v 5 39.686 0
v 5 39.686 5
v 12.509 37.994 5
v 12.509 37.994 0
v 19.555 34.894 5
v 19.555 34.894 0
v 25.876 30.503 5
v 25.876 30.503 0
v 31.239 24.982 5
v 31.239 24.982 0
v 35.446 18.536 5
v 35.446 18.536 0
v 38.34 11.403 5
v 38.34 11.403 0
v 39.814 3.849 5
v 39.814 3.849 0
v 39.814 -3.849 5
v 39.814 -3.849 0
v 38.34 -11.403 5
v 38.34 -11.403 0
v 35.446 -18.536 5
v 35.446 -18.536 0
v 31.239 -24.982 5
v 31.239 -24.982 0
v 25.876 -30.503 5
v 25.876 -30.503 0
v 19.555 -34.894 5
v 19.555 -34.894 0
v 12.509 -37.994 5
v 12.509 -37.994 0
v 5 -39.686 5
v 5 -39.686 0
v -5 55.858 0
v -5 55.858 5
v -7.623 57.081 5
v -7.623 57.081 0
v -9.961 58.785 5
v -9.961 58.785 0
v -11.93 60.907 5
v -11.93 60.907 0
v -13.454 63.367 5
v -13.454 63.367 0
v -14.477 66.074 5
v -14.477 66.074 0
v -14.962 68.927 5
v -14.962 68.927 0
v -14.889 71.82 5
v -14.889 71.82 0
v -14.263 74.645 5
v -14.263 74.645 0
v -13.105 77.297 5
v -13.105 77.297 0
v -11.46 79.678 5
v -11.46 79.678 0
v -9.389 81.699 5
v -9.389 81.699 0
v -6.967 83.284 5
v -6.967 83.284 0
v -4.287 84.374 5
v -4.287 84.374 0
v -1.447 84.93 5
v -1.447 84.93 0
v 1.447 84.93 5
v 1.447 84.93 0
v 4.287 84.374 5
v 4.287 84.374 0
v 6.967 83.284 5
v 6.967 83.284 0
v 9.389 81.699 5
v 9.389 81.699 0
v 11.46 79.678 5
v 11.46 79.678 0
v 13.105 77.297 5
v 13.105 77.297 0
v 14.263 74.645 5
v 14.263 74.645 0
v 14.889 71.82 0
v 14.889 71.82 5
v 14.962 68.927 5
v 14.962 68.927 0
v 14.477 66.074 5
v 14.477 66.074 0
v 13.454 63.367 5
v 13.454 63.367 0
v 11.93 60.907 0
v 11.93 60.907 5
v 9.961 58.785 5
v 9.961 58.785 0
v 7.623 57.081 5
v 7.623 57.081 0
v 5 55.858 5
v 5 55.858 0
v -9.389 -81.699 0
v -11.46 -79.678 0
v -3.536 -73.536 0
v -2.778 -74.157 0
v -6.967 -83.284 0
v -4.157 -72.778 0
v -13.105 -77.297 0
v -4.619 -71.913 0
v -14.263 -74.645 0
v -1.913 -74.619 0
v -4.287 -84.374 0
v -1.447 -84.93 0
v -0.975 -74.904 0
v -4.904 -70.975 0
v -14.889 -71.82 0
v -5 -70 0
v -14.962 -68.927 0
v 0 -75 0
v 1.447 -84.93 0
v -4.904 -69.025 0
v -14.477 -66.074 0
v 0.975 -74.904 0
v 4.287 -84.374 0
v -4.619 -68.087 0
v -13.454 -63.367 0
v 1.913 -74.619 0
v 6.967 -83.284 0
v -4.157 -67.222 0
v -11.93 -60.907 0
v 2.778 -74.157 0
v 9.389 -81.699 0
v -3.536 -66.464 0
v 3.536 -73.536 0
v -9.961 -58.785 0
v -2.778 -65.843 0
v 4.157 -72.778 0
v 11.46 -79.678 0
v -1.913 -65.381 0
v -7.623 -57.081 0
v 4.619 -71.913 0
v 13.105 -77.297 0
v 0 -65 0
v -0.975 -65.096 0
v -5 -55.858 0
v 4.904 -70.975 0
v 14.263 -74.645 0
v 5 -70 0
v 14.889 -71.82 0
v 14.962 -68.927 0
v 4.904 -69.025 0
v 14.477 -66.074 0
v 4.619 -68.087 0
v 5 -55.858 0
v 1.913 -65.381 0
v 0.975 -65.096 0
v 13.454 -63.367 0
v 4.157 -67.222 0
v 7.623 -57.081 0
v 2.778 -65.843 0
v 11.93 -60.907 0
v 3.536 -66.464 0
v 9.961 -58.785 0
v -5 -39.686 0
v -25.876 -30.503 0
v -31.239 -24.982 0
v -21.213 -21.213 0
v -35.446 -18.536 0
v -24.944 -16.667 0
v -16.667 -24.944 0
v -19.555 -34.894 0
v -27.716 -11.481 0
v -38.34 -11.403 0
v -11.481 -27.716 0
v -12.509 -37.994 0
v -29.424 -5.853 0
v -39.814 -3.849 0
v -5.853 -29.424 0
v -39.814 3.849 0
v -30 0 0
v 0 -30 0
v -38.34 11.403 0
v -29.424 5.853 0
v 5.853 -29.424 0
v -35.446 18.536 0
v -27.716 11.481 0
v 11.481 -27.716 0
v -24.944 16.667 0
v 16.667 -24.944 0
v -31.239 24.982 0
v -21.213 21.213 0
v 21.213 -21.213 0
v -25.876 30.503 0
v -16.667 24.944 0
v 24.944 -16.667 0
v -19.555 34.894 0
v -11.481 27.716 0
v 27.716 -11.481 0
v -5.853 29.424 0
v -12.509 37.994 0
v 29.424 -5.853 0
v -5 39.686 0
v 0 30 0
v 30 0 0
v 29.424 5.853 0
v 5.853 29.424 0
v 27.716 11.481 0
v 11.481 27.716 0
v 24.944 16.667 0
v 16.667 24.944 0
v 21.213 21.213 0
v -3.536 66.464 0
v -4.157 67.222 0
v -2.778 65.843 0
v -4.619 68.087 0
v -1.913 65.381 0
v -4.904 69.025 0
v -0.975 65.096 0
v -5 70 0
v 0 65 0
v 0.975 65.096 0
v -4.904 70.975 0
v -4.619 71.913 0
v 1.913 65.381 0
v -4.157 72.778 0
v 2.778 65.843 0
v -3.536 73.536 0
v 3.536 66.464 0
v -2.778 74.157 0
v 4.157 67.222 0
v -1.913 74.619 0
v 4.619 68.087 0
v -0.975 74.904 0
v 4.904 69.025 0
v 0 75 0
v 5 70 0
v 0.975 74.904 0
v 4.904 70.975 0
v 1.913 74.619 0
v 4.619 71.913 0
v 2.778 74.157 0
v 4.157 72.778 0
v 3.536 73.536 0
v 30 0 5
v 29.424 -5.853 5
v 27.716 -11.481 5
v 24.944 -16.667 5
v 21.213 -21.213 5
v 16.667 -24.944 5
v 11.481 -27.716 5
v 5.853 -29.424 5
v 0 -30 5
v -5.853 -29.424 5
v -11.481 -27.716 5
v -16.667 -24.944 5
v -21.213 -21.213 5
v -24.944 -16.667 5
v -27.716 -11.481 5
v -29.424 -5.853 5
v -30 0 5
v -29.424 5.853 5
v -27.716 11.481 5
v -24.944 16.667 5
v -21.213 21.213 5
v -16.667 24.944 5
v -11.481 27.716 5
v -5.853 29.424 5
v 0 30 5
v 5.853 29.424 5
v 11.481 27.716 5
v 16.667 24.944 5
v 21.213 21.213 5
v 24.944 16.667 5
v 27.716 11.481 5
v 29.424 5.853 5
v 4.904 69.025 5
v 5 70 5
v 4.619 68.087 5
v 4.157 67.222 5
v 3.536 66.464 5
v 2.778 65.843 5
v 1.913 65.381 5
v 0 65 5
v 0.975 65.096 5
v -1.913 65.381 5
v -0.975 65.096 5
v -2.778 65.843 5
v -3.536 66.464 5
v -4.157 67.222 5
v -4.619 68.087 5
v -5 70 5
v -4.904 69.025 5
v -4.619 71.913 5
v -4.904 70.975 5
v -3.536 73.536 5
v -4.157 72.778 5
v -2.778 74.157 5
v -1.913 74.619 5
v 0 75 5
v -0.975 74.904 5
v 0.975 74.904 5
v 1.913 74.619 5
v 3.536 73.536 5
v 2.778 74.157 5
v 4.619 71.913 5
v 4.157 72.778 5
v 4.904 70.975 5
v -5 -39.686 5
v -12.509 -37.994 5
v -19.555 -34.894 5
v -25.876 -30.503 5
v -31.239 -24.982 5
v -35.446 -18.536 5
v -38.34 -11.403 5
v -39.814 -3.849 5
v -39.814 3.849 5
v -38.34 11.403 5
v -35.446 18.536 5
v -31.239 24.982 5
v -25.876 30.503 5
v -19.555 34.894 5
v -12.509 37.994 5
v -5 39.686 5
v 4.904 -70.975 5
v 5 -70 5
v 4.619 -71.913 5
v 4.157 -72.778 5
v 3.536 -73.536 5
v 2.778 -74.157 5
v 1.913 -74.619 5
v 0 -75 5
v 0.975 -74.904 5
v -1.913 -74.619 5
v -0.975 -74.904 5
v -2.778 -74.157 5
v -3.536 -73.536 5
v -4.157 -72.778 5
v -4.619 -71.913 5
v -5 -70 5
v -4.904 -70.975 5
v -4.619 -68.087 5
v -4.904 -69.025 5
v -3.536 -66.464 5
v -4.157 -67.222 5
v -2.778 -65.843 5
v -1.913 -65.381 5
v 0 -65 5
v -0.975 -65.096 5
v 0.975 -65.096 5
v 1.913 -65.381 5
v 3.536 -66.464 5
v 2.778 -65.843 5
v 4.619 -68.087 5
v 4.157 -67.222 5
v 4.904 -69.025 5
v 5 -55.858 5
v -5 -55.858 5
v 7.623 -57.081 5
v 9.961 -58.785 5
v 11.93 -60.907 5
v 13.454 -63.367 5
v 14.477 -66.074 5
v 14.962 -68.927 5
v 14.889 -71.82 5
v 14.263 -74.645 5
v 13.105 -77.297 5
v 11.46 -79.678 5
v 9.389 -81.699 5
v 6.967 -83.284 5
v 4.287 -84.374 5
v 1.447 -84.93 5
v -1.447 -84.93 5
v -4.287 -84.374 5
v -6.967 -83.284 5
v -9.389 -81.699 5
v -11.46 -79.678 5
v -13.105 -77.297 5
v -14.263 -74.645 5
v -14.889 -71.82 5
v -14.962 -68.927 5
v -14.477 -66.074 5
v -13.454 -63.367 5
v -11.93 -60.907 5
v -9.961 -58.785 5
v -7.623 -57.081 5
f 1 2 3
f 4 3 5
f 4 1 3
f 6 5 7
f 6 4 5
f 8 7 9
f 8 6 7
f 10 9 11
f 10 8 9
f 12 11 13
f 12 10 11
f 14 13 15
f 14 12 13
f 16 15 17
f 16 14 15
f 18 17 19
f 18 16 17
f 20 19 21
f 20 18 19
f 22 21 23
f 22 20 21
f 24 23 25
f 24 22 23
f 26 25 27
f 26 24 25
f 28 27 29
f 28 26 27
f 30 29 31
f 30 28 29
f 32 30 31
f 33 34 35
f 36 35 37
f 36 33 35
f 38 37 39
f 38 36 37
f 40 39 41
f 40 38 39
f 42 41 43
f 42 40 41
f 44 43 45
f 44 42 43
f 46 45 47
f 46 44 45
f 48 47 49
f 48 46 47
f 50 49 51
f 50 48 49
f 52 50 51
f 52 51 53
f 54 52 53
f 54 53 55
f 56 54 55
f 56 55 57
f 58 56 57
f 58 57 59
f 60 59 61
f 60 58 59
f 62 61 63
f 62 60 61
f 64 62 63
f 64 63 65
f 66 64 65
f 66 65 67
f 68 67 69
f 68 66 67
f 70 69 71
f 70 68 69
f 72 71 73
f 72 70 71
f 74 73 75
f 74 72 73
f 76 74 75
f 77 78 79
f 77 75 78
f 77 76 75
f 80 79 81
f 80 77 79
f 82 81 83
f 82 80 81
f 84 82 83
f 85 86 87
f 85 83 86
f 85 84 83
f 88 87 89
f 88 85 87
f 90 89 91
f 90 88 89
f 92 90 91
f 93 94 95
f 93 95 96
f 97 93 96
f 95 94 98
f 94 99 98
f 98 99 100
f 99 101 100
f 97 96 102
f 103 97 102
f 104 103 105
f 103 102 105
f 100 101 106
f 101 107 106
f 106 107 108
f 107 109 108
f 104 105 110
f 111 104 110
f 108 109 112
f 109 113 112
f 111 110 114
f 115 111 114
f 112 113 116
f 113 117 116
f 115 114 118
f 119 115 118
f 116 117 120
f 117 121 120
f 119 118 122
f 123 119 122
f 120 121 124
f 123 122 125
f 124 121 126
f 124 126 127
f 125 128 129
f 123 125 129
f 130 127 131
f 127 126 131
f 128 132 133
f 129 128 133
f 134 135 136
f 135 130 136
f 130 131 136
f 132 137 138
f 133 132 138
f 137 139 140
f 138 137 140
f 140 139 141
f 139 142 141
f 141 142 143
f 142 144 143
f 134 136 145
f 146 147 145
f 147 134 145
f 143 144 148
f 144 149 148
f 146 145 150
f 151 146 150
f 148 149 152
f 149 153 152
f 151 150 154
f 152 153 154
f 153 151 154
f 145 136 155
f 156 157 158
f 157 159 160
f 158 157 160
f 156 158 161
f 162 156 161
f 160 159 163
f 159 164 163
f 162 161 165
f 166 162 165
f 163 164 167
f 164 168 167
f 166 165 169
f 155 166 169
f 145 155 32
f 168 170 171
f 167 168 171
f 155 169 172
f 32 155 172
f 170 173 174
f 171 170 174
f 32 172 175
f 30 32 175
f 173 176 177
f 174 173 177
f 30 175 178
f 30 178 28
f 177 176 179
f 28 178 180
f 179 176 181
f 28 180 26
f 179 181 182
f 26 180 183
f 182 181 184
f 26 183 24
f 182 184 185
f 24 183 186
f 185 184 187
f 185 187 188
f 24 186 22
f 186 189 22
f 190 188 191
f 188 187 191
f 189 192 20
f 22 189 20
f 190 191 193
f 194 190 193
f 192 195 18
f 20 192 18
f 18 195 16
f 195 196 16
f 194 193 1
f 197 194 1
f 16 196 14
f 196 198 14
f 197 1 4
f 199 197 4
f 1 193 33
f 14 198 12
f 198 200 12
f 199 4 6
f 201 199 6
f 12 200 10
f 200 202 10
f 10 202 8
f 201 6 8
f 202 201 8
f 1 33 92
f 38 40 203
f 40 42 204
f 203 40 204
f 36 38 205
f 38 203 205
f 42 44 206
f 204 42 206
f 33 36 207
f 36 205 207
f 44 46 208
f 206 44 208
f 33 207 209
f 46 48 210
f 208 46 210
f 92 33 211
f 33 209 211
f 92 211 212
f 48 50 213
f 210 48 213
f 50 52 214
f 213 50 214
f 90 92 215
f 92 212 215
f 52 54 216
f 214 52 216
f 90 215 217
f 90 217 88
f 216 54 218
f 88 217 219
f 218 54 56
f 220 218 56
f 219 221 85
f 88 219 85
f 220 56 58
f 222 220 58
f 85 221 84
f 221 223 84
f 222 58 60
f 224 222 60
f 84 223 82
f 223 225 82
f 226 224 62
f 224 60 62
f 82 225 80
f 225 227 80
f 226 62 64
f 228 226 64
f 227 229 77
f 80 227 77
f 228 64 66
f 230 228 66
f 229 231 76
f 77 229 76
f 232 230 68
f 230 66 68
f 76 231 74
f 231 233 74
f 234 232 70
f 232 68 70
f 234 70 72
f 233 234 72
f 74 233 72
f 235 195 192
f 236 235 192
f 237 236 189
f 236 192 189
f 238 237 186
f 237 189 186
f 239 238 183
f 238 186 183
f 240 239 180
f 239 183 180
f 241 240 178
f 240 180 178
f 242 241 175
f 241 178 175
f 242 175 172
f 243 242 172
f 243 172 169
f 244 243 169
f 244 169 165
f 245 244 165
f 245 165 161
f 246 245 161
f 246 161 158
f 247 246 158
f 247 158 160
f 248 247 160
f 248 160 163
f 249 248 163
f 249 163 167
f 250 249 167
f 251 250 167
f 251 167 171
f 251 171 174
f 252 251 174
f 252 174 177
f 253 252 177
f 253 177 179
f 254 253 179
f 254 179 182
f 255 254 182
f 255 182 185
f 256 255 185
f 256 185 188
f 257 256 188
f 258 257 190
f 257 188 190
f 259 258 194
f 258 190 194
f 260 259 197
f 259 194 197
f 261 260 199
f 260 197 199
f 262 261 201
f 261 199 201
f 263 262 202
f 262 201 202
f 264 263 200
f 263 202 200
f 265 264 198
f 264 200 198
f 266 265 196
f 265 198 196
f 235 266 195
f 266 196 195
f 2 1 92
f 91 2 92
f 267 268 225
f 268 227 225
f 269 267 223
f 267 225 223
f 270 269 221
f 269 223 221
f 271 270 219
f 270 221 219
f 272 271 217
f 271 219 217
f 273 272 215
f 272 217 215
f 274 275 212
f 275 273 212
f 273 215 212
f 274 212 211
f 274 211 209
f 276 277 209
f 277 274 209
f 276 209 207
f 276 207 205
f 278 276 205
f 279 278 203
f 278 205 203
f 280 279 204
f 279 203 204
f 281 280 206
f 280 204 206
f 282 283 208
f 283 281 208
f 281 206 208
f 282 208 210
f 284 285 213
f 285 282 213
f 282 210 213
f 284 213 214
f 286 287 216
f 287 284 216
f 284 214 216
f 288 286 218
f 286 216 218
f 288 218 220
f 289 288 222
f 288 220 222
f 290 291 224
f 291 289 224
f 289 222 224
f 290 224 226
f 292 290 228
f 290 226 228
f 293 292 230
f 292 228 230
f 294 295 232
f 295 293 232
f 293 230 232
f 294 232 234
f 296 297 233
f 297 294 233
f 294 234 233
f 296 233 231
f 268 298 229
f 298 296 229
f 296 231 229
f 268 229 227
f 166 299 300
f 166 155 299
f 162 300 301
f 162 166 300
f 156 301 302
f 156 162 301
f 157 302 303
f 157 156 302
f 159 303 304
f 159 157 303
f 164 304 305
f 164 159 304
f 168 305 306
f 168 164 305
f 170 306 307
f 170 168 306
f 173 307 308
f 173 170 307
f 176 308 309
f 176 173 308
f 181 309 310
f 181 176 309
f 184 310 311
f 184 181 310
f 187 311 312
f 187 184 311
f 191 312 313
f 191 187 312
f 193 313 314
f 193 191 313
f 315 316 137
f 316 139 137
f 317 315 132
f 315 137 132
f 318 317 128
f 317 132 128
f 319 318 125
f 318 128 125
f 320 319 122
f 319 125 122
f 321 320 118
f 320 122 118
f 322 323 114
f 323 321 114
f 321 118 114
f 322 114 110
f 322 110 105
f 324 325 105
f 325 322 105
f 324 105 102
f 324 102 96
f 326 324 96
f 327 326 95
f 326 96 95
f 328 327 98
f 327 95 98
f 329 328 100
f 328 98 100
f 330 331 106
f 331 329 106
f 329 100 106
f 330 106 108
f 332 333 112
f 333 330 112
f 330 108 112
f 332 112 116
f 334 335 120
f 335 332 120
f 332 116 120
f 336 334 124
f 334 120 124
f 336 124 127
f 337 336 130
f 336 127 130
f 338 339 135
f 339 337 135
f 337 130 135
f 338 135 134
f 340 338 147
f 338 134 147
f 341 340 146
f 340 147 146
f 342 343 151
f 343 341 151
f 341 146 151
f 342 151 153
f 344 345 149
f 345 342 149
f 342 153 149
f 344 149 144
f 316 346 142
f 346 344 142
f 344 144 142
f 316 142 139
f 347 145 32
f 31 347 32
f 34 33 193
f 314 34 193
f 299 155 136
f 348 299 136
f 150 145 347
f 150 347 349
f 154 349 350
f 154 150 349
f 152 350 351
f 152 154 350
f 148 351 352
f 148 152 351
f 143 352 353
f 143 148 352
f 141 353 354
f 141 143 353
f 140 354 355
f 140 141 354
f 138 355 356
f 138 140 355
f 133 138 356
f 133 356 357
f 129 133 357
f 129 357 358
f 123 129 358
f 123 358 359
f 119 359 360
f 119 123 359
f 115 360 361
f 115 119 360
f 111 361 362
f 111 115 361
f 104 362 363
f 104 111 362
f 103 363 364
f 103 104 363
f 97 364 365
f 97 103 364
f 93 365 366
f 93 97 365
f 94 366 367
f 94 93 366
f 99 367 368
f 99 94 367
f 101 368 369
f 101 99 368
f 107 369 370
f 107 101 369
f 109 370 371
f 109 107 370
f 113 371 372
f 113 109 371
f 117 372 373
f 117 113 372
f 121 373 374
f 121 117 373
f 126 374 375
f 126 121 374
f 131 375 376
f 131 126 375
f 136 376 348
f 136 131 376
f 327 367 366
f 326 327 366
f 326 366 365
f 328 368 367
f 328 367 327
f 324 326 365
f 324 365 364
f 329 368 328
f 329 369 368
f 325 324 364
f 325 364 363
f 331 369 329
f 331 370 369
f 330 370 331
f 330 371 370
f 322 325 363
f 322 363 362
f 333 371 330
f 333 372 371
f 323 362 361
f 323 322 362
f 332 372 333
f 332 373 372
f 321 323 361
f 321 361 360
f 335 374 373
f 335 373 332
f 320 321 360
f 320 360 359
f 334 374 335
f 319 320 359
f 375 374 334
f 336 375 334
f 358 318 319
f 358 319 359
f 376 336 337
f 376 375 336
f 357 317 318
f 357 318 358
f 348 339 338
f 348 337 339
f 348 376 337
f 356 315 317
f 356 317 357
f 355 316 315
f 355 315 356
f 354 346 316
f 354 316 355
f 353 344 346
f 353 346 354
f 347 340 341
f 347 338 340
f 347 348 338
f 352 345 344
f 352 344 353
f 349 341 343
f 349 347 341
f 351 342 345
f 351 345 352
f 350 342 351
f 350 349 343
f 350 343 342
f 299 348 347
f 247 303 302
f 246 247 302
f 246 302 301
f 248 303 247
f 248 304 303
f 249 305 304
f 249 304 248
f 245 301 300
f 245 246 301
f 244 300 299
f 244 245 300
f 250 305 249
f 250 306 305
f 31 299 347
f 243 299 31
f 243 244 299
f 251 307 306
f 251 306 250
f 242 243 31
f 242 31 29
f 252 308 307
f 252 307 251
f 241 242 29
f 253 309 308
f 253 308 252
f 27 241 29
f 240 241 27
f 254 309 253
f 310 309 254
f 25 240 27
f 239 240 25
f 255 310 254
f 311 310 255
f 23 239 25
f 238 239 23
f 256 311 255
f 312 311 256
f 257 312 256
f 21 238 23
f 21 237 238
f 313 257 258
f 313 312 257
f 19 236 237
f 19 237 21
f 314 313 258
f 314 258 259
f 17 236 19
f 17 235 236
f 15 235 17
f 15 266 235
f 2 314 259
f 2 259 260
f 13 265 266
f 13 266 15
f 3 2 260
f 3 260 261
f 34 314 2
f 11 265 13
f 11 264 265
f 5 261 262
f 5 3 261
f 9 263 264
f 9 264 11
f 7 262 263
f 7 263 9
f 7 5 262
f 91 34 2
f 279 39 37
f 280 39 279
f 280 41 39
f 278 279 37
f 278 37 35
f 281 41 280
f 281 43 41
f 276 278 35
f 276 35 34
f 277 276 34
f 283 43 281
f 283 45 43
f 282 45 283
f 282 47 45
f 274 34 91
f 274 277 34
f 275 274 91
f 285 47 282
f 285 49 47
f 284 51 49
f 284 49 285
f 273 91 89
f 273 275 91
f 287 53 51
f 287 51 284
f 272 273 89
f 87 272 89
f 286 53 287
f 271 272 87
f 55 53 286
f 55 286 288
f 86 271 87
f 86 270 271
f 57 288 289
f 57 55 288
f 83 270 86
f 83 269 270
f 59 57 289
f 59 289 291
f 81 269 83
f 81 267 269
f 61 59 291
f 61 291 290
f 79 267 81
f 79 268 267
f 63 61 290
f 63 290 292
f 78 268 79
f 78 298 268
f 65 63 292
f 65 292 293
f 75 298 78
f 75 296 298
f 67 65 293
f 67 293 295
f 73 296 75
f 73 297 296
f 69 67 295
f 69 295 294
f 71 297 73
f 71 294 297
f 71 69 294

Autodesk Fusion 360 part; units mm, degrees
sketch "Sketch1" plane through (0, 0, 0) normal (0, 0, 1) x (1, 0, 0)
  circle A0 centre (0, 0) radius 90
  circle A1 centre (0, 65) radius 10
  circle A2 centre (0, -65) radius 10
  circle A3 centre (0, 0) radius 25
  circle A4 centre (0, 0) radius 35
  circle A5 centre (0, 65) radius 20
  circle A6 centre (0, -65) radius 20
  line L0 (-10, 30) -> (10, 30)
  line L1 (10, 30) -> (10, 50)
  line L2 (10, 50) -> (-10, 50)
  line L3 (-10, 50) -> (-10, 30)
  line L4 (-10, -30) -> (10, -30)
  line L5 (10, -30) -> (10, -50)
  line L6 (10, -50) -> (-10, -50)
  line L7 (-10, -50) -> (-10, -30)
  dimension "d1" = 50
sketch "Sketch2" plane through (0, 0, 0) normal (0, 0, 1) x (1, 0, 0)
sketch "Sketch3" plane through (0, 0, 0) normal (0, 0, 1) x (1, 0, 0)
  circle A0 centre (0, 0) radius 30
sketch "Sketch4" plane through (0, 0, 0) normal (0, 0, 1) x (1, 0, 0)
sketch "Sketch5" plane through (0, 0, 0) normal (0, 1, 0) x (1, 0, 0)
sketch "Sketch6" plane through (0, 0, 0) normal (0, 0, 1) x (1, 0, 0)
  circle A0 centre (0, 65) radius 5.25
  circle A1 centre (0, 65) radius 10
  dimension "d6" = 10.5
sketch "Sketch7" plane through (0, 0, 0) normal (0, 0, 1) x (1, 0, 0)
  circle A0 centre (0, -65) radius 5.25
  circle A1 centre (0, -65) radius 10
  dimension "d9" = 10.5
sketch "Sketch8" plane through (0, 0, 0) normal (0, 0, 1) x (1, 0, 0)
  circle A0 centre (0, 0) radius 40
  circle A1 centre (0, 0) radius 30
  circle A2 centre (0, 0) radius 30
sketch "Sketch9" plane through (0, 0, 0) normal (0, 0, 1) x (1, 0, 0)
sketch "Sketch10" plane through (0, 0, 0) normal (0, 0, 1) x (1, 0, 0)
sketch "Sketch11" plane through (0, 0, 0) normal (0, 0, 1) x (1, 0, 0)
sketch "Sketch12" plane through (0, 0, 0) normal (0, 0, 1) x (1, 0, 0)
  circle A0 centre (0, 65) radius 15
  circle A1 centre (0, 65) radius 20
sketch "Sketch13" plane through (0, 0, 0) normal (0, 0, 1) x (1, 0, 0)
  circle A0 centre (0, -65) radius 15
  circle A1 centre (0, -65) radius 20
extrude "Extrude7" cut sketch "Sketch13" along normal blind 22
sketch "Sketch14" plane through (0, 0, 0) normal (0, 0, 1) x (1, 0, 0)
  line L0 (-10, -35) -> (10, -35)
  line L1 (10, -35) -> (10, -59)
  line L2 (10, -59) -> (-10, -59)
  line L3 (-10, -59) -> (-10, -35)
  line L4 (-10, 35) -> (10, 35)
  line L5 (10, 35) -> (10, 58)
  line L6 (10, 58) -> (-10, 58)
  line L7 (-10, 58) -> (-10, 35)
sketch "Sketch15" plane through (0, 0, 0) normal (0, 0, 1) x (1, 0, 0)
sketch "Sketch16" plane through (0, 0, 0) normal (0, 0, 1) x (1, 0, 0)
sketch "Sketch17" plane through (0, 0, 0) normal (0, 0, 1) x (1, 0, 0)
sketch "Sketch18" plane through (0, 0, 0) normal (0, 0, 1) x (1, 0, 0)
  line L0 (0, -60) -> (0, 60)
  circle A0 centre (0, 0) radius 40
  circle A1 centre (0, 0) radius 30
  circle A2 centre (0, 70) radius 5
  circle A3 centre (0, -70) radius 5
  circle A4 centre (0, 70) radius 15
  circle A5 centre (0, -70) radius 15
sketch "Sketch19" plane through (0, 0, 0) normal (0, 0, 1) x (1, 0, 0)
extrude "Extrude9" add sketch "Sketch18" along normal blind 5 separate body contours A4 | L0 A0 A1 | L0 A0 A1 | A5 makes body 1 at (11.5922, -69.0064, 5) makes body 2 at (36.4061, -3.4777, 5) makes body 3 at (11.6108, 69.2548, 0)
sketch "Sketch20" plane through (0, 0, 0) normal (0, 0, 1) x (1, 0, 0)
  line L0 (-7, -37) -> (8, -37)
  line L1 (8, -37) -> (8, -59)
  line L2 (8, -59) -> (-7, -59)
  line L3 (-7, -59) -> (-7, -37)
  line L4 (8, -37) -> (-8, -37)
  line L5 (-8, -37) -> (-8, -59)
  line L6 (-8, -59) -> (8, -59)
  line L7 (8, -59) -> (8, -37)
  line L8 (-8, 37) -> (7, 37)
  line L9 (7, 37) -> (7, 61)
  line L10 (7, 61) -> (-8, 61)
  line L11 (-8, 61) -> (-8, 37)
  line L12 (-5, 38) -> (5, 38)
  line L13 (5, 38) -> (5, 59)
  line L14 (5, 59) -> (-5, 59)
  line L15 (-5, 59) -> (-5, 38)
  line L16 (5, -35) -> (-5, -35)
  line L17 (-5, -35) -> (-5, -59)
  line L18 (-5, -59) -> (5, -59)
  line L19 (5, -59) -> (5, -35)
extrude "Extrude10" add sketch "Sketch20" along normal blind 5 contours L0 L2 L4 L6 L17 L18 L19 | L12 L13 L14 L15 bodies 1 2 3
